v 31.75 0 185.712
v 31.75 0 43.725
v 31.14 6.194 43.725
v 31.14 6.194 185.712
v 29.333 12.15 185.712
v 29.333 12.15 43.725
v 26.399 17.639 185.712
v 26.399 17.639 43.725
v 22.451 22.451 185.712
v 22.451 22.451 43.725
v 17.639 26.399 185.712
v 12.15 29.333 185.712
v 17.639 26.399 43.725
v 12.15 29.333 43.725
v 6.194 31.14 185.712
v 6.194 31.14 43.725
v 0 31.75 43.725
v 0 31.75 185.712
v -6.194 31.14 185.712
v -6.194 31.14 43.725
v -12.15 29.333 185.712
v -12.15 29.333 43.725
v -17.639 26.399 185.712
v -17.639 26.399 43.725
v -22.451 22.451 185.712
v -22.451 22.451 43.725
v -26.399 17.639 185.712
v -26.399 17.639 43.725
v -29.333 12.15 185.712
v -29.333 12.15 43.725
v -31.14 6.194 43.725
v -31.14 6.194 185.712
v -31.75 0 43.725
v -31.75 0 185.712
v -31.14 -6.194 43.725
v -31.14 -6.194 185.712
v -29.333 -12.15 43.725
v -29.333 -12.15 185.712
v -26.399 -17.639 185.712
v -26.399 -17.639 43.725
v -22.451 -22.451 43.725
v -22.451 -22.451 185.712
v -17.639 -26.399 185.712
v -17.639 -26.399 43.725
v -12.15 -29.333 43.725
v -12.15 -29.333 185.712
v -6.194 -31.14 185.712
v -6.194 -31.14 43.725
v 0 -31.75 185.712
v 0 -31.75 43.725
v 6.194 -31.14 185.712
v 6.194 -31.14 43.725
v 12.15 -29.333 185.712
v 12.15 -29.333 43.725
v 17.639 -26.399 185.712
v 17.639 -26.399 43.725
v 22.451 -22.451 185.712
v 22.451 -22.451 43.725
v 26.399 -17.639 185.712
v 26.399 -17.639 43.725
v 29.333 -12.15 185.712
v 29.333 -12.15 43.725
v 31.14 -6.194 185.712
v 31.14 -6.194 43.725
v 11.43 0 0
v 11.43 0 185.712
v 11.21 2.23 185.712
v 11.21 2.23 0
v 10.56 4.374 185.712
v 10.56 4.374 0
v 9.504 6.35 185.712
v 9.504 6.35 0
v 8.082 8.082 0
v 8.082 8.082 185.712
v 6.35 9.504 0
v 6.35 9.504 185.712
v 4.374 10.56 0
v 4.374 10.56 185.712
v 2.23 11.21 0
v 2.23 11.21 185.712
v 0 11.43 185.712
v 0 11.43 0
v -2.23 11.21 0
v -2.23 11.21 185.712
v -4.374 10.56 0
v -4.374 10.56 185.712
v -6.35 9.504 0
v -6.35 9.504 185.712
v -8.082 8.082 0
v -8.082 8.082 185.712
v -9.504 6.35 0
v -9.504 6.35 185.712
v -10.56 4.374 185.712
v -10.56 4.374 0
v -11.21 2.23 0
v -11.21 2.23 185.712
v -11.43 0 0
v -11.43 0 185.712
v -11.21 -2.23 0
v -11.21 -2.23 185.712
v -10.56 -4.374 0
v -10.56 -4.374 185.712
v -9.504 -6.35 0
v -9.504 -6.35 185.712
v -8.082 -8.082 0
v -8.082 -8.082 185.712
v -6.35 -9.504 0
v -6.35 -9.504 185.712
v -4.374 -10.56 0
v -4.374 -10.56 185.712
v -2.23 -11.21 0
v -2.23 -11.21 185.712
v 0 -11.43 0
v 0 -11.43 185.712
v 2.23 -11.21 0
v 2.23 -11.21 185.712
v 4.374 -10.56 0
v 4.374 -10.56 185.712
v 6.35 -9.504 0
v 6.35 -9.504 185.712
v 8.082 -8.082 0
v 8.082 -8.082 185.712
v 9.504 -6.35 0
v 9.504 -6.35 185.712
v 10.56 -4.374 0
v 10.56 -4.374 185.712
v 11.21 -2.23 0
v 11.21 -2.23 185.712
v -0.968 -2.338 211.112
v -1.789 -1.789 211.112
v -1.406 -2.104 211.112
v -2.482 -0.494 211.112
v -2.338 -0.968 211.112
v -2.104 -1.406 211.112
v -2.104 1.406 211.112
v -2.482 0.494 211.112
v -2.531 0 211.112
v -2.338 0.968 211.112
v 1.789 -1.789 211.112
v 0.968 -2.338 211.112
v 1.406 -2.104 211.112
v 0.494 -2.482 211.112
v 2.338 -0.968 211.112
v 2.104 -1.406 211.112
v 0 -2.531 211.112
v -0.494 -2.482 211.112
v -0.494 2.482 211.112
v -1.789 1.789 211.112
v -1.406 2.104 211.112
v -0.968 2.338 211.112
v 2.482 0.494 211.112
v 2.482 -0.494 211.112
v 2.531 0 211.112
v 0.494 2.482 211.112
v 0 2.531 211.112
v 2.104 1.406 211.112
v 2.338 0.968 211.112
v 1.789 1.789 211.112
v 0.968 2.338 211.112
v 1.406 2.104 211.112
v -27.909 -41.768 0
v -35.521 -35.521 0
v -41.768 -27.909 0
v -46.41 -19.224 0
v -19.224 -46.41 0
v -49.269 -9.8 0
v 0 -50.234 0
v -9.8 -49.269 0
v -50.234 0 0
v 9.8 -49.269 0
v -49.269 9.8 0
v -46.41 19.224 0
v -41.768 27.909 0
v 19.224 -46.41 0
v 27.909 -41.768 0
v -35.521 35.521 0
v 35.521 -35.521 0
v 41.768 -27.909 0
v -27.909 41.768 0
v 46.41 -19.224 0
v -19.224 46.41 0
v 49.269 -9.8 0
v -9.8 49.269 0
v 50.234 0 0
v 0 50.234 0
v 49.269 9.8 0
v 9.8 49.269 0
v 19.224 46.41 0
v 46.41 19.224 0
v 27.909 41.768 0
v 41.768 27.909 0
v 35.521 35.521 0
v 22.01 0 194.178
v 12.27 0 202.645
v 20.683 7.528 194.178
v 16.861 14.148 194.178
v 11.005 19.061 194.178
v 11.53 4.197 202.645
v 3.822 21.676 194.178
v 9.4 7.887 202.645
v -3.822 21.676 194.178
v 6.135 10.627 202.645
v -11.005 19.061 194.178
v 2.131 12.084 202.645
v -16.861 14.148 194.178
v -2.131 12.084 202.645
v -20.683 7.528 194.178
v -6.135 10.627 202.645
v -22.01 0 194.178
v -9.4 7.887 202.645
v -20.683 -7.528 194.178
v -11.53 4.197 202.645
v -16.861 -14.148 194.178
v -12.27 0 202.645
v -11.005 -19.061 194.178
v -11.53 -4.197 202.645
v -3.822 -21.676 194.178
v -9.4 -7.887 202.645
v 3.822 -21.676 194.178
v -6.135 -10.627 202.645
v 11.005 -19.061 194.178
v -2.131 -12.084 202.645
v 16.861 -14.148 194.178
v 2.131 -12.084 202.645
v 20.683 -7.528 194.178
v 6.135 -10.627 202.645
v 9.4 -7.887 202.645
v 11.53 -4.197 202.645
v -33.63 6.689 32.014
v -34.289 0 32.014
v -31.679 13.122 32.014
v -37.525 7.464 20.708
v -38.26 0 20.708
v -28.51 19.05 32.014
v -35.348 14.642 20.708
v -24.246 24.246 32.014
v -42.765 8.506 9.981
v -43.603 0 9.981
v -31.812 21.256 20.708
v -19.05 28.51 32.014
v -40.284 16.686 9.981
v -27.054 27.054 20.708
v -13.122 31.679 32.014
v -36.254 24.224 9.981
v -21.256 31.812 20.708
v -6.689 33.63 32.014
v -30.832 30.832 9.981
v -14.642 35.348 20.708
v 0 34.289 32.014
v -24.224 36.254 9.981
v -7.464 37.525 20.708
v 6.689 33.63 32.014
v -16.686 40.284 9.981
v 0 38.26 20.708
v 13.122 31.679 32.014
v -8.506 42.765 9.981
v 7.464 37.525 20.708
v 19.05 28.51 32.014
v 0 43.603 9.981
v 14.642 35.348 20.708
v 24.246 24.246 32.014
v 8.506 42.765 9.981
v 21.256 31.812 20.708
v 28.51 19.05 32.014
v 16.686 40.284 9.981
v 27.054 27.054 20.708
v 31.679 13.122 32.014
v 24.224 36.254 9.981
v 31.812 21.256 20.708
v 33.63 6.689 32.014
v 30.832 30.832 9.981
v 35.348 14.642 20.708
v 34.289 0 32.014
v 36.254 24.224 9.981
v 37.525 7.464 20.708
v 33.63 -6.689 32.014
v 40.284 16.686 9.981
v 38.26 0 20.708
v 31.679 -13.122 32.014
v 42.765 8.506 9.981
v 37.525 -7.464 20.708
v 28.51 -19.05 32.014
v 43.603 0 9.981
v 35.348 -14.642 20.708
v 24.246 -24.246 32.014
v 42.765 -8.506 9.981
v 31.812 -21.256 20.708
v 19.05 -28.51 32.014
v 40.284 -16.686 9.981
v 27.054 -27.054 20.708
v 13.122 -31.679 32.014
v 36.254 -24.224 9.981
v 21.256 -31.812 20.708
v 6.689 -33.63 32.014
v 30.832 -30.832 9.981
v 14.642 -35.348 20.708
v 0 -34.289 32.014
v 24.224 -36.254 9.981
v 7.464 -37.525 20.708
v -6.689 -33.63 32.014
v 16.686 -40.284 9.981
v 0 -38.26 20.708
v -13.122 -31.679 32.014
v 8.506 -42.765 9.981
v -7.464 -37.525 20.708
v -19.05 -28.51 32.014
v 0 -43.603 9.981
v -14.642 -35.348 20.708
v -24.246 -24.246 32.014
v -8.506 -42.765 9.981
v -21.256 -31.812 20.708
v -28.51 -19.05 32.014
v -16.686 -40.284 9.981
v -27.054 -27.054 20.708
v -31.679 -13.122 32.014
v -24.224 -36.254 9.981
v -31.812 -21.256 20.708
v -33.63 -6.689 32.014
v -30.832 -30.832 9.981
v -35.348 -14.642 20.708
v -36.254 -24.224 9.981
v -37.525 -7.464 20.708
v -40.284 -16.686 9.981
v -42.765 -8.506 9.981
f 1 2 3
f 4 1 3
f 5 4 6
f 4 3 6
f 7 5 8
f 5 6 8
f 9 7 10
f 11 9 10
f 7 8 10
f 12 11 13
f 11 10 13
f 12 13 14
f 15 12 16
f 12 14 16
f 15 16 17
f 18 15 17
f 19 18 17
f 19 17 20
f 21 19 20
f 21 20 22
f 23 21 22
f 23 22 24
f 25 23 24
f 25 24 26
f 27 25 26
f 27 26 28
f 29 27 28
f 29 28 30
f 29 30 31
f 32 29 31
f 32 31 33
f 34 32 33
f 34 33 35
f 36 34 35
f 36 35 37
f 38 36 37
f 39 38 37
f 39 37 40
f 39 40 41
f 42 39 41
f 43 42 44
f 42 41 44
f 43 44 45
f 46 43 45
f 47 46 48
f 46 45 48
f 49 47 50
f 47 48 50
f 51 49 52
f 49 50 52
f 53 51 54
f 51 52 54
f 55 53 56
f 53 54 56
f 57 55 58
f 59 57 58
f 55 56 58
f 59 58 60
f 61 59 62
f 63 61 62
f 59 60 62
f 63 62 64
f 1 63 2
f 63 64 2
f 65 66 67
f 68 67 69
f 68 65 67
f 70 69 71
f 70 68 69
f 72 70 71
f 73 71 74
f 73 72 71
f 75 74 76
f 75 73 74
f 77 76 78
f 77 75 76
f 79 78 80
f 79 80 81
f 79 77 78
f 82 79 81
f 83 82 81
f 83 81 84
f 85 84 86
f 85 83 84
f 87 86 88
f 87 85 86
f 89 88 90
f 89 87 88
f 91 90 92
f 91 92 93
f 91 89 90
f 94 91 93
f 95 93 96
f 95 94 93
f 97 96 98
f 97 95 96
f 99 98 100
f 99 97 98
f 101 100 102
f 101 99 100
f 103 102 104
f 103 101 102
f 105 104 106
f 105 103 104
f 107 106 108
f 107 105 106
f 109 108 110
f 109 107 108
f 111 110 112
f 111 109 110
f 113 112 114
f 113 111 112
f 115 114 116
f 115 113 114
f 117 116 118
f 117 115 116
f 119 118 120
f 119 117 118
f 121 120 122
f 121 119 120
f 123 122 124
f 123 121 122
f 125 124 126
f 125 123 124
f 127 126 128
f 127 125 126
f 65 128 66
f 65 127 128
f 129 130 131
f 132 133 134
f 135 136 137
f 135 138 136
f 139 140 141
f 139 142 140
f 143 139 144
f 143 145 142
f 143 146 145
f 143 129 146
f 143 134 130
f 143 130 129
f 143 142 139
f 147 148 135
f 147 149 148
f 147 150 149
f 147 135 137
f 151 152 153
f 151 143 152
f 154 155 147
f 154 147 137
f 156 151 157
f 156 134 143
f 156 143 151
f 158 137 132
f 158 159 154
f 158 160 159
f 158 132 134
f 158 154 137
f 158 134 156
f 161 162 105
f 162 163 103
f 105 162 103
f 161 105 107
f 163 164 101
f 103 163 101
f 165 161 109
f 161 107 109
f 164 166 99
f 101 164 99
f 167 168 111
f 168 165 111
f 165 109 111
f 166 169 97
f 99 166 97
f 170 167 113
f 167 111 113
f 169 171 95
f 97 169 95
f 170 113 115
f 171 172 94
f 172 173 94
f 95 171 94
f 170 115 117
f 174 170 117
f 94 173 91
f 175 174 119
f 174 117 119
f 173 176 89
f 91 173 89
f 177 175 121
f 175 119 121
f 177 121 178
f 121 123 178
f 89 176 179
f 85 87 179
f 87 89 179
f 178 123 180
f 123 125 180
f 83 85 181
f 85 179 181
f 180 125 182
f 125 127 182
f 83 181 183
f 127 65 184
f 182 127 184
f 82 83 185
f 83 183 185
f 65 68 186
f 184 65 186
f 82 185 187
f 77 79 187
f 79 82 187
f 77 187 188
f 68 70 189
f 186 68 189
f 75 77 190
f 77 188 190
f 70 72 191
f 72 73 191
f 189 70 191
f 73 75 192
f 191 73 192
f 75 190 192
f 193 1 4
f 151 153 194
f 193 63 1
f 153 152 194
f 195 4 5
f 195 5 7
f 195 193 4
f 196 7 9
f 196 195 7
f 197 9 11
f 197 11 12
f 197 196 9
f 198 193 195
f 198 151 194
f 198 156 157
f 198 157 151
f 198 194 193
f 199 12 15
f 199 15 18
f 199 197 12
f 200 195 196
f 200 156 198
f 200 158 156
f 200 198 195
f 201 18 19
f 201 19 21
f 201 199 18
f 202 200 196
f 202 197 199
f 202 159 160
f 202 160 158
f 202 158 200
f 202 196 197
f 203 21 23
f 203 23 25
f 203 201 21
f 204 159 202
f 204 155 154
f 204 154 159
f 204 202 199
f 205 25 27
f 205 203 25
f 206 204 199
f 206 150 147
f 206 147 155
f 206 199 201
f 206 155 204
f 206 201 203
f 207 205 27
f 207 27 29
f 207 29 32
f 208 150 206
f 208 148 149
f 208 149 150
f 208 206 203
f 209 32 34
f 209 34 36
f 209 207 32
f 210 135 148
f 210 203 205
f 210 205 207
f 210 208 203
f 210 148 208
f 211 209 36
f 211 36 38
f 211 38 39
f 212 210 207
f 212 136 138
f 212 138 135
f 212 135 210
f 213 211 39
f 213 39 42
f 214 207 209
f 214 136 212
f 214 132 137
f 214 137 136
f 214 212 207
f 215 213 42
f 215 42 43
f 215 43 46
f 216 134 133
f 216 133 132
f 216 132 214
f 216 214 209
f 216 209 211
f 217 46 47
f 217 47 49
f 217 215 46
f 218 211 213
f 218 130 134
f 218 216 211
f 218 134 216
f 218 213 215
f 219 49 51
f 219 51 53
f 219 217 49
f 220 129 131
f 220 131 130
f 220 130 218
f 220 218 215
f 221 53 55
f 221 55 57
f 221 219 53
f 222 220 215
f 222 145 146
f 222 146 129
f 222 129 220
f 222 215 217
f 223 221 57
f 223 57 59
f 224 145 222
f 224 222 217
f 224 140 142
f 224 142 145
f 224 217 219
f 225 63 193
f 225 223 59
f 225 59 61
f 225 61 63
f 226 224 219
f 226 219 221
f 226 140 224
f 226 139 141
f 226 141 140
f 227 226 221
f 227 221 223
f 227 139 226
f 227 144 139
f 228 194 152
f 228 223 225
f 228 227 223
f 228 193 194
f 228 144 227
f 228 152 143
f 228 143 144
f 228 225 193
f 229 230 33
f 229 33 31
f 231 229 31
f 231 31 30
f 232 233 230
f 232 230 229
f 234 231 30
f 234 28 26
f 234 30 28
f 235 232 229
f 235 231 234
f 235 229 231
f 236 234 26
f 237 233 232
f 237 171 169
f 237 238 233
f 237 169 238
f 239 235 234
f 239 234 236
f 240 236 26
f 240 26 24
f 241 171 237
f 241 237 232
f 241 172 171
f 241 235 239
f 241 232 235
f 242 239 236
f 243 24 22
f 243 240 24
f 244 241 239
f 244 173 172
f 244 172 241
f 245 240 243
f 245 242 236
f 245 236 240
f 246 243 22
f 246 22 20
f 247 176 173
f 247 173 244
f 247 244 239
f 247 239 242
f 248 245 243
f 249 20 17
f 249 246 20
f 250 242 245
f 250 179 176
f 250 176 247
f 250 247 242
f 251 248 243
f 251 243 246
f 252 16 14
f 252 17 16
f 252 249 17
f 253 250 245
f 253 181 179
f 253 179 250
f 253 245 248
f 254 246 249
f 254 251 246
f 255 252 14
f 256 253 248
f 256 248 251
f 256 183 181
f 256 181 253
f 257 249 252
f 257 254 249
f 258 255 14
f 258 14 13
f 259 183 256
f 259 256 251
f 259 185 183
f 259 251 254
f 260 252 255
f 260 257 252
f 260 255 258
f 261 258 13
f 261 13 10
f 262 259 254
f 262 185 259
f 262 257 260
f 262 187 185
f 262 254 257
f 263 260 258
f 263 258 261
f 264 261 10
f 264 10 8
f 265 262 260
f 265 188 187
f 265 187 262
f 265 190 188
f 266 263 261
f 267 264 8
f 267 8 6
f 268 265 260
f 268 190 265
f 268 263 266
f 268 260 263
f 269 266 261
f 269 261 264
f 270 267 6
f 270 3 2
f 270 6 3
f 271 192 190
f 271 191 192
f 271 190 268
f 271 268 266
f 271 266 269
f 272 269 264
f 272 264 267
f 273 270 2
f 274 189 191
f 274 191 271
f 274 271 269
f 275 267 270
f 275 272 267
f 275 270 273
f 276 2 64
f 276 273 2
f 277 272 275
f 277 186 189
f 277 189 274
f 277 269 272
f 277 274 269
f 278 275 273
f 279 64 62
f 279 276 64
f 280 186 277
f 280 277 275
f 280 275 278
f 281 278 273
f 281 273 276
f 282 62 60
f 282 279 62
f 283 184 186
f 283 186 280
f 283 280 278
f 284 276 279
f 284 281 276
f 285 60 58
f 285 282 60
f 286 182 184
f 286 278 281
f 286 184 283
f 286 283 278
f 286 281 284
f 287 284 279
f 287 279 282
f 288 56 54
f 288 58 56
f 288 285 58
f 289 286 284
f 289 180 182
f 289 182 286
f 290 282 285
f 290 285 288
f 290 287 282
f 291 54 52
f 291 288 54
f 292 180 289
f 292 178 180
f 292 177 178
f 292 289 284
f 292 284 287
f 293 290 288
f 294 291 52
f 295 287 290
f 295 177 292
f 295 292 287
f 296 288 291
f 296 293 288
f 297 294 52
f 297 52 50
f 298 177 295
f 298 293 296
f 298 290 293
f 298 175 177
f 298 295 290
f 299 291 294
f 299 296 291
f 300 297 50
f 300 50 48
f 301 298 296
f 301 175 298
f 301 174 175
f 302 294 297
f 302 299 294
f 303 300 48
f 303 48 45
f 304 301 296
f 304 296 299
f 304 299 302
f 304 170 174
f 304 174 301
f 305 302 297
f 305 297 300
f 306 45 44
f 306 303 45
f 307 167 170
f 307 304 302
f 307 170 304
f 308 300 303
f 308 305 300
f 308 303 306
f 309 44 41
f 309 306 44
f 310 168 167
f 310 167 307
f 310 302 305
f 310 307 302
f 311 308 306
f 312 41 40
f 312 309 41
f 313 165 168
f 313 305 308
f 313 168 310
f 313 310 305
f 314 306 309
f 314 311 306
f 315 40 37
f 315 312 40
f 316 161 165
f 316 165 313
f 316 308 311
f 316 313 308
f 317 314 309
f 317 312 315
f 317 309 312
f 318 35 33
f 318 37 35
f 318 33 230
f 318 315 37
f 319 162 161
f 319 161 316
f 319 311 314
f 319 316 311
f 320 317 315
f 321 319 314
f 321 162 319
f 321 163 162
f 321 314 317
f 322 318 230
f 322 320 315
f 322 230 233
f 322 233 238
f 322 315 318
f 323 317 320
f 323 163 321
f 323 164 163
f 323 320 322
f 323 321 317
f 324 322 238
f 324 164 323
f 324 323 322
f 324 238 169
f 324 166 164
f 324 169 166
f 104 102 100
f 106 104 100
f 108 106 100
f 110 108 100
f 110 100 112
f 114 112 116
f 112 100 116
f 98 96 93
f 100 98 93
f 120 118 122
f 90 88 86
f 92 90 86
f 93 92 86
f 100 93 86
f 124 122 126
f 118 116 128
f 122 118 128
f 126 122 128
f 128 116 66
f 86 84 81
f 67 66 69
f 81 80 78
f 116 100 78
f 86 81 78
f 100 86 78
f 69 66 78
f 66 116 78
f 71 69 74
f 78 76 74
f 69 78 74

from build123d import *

# Parameters (mm, degrees)
F0_R     = 31.75
F0_R_2   = 11.43
F1_DEPTH = 185.71182
F4_R     = 31.75
F5_DEPTH = 25.4
F5_TAPER = 49


with BuildPart() as f1:
    # F0 (on Top) → F1 (new body)
    with BuildSketch(Plane.XY):
        Circle(F0_R)
        Circle(F0_R_2, mode=Mode.SUBTRACT)
    extrude(amount=F1_DEPTH)

    # F2 (on Front) → F3 (revolve)
    with BuildSketch(Plane.XZ):
        with BuildLine():
            ThreePointArc((-30.6478571147, 58.2644540342), (-35.6754691099, 27.5302272186), (-50.2341836691, 0))
            Line((-50.2341836691, 0), (-30.6478571147, 0))
            Line((-30.6478571147, 0), (-30.6478571147, 58.2644540342))
        make_face()
    revolve(axis=Axis((0, 0, 38.0581654608), (0, 0, -1)))

    # F4 (on face) → F5 (join)
    with BuildSketch(Plane.XY.offset(185.71182)):
        Circle(F4_R)
    extrude(amount=F5_DEPTH, taper=F5_TAPER)


solid = f1.part
